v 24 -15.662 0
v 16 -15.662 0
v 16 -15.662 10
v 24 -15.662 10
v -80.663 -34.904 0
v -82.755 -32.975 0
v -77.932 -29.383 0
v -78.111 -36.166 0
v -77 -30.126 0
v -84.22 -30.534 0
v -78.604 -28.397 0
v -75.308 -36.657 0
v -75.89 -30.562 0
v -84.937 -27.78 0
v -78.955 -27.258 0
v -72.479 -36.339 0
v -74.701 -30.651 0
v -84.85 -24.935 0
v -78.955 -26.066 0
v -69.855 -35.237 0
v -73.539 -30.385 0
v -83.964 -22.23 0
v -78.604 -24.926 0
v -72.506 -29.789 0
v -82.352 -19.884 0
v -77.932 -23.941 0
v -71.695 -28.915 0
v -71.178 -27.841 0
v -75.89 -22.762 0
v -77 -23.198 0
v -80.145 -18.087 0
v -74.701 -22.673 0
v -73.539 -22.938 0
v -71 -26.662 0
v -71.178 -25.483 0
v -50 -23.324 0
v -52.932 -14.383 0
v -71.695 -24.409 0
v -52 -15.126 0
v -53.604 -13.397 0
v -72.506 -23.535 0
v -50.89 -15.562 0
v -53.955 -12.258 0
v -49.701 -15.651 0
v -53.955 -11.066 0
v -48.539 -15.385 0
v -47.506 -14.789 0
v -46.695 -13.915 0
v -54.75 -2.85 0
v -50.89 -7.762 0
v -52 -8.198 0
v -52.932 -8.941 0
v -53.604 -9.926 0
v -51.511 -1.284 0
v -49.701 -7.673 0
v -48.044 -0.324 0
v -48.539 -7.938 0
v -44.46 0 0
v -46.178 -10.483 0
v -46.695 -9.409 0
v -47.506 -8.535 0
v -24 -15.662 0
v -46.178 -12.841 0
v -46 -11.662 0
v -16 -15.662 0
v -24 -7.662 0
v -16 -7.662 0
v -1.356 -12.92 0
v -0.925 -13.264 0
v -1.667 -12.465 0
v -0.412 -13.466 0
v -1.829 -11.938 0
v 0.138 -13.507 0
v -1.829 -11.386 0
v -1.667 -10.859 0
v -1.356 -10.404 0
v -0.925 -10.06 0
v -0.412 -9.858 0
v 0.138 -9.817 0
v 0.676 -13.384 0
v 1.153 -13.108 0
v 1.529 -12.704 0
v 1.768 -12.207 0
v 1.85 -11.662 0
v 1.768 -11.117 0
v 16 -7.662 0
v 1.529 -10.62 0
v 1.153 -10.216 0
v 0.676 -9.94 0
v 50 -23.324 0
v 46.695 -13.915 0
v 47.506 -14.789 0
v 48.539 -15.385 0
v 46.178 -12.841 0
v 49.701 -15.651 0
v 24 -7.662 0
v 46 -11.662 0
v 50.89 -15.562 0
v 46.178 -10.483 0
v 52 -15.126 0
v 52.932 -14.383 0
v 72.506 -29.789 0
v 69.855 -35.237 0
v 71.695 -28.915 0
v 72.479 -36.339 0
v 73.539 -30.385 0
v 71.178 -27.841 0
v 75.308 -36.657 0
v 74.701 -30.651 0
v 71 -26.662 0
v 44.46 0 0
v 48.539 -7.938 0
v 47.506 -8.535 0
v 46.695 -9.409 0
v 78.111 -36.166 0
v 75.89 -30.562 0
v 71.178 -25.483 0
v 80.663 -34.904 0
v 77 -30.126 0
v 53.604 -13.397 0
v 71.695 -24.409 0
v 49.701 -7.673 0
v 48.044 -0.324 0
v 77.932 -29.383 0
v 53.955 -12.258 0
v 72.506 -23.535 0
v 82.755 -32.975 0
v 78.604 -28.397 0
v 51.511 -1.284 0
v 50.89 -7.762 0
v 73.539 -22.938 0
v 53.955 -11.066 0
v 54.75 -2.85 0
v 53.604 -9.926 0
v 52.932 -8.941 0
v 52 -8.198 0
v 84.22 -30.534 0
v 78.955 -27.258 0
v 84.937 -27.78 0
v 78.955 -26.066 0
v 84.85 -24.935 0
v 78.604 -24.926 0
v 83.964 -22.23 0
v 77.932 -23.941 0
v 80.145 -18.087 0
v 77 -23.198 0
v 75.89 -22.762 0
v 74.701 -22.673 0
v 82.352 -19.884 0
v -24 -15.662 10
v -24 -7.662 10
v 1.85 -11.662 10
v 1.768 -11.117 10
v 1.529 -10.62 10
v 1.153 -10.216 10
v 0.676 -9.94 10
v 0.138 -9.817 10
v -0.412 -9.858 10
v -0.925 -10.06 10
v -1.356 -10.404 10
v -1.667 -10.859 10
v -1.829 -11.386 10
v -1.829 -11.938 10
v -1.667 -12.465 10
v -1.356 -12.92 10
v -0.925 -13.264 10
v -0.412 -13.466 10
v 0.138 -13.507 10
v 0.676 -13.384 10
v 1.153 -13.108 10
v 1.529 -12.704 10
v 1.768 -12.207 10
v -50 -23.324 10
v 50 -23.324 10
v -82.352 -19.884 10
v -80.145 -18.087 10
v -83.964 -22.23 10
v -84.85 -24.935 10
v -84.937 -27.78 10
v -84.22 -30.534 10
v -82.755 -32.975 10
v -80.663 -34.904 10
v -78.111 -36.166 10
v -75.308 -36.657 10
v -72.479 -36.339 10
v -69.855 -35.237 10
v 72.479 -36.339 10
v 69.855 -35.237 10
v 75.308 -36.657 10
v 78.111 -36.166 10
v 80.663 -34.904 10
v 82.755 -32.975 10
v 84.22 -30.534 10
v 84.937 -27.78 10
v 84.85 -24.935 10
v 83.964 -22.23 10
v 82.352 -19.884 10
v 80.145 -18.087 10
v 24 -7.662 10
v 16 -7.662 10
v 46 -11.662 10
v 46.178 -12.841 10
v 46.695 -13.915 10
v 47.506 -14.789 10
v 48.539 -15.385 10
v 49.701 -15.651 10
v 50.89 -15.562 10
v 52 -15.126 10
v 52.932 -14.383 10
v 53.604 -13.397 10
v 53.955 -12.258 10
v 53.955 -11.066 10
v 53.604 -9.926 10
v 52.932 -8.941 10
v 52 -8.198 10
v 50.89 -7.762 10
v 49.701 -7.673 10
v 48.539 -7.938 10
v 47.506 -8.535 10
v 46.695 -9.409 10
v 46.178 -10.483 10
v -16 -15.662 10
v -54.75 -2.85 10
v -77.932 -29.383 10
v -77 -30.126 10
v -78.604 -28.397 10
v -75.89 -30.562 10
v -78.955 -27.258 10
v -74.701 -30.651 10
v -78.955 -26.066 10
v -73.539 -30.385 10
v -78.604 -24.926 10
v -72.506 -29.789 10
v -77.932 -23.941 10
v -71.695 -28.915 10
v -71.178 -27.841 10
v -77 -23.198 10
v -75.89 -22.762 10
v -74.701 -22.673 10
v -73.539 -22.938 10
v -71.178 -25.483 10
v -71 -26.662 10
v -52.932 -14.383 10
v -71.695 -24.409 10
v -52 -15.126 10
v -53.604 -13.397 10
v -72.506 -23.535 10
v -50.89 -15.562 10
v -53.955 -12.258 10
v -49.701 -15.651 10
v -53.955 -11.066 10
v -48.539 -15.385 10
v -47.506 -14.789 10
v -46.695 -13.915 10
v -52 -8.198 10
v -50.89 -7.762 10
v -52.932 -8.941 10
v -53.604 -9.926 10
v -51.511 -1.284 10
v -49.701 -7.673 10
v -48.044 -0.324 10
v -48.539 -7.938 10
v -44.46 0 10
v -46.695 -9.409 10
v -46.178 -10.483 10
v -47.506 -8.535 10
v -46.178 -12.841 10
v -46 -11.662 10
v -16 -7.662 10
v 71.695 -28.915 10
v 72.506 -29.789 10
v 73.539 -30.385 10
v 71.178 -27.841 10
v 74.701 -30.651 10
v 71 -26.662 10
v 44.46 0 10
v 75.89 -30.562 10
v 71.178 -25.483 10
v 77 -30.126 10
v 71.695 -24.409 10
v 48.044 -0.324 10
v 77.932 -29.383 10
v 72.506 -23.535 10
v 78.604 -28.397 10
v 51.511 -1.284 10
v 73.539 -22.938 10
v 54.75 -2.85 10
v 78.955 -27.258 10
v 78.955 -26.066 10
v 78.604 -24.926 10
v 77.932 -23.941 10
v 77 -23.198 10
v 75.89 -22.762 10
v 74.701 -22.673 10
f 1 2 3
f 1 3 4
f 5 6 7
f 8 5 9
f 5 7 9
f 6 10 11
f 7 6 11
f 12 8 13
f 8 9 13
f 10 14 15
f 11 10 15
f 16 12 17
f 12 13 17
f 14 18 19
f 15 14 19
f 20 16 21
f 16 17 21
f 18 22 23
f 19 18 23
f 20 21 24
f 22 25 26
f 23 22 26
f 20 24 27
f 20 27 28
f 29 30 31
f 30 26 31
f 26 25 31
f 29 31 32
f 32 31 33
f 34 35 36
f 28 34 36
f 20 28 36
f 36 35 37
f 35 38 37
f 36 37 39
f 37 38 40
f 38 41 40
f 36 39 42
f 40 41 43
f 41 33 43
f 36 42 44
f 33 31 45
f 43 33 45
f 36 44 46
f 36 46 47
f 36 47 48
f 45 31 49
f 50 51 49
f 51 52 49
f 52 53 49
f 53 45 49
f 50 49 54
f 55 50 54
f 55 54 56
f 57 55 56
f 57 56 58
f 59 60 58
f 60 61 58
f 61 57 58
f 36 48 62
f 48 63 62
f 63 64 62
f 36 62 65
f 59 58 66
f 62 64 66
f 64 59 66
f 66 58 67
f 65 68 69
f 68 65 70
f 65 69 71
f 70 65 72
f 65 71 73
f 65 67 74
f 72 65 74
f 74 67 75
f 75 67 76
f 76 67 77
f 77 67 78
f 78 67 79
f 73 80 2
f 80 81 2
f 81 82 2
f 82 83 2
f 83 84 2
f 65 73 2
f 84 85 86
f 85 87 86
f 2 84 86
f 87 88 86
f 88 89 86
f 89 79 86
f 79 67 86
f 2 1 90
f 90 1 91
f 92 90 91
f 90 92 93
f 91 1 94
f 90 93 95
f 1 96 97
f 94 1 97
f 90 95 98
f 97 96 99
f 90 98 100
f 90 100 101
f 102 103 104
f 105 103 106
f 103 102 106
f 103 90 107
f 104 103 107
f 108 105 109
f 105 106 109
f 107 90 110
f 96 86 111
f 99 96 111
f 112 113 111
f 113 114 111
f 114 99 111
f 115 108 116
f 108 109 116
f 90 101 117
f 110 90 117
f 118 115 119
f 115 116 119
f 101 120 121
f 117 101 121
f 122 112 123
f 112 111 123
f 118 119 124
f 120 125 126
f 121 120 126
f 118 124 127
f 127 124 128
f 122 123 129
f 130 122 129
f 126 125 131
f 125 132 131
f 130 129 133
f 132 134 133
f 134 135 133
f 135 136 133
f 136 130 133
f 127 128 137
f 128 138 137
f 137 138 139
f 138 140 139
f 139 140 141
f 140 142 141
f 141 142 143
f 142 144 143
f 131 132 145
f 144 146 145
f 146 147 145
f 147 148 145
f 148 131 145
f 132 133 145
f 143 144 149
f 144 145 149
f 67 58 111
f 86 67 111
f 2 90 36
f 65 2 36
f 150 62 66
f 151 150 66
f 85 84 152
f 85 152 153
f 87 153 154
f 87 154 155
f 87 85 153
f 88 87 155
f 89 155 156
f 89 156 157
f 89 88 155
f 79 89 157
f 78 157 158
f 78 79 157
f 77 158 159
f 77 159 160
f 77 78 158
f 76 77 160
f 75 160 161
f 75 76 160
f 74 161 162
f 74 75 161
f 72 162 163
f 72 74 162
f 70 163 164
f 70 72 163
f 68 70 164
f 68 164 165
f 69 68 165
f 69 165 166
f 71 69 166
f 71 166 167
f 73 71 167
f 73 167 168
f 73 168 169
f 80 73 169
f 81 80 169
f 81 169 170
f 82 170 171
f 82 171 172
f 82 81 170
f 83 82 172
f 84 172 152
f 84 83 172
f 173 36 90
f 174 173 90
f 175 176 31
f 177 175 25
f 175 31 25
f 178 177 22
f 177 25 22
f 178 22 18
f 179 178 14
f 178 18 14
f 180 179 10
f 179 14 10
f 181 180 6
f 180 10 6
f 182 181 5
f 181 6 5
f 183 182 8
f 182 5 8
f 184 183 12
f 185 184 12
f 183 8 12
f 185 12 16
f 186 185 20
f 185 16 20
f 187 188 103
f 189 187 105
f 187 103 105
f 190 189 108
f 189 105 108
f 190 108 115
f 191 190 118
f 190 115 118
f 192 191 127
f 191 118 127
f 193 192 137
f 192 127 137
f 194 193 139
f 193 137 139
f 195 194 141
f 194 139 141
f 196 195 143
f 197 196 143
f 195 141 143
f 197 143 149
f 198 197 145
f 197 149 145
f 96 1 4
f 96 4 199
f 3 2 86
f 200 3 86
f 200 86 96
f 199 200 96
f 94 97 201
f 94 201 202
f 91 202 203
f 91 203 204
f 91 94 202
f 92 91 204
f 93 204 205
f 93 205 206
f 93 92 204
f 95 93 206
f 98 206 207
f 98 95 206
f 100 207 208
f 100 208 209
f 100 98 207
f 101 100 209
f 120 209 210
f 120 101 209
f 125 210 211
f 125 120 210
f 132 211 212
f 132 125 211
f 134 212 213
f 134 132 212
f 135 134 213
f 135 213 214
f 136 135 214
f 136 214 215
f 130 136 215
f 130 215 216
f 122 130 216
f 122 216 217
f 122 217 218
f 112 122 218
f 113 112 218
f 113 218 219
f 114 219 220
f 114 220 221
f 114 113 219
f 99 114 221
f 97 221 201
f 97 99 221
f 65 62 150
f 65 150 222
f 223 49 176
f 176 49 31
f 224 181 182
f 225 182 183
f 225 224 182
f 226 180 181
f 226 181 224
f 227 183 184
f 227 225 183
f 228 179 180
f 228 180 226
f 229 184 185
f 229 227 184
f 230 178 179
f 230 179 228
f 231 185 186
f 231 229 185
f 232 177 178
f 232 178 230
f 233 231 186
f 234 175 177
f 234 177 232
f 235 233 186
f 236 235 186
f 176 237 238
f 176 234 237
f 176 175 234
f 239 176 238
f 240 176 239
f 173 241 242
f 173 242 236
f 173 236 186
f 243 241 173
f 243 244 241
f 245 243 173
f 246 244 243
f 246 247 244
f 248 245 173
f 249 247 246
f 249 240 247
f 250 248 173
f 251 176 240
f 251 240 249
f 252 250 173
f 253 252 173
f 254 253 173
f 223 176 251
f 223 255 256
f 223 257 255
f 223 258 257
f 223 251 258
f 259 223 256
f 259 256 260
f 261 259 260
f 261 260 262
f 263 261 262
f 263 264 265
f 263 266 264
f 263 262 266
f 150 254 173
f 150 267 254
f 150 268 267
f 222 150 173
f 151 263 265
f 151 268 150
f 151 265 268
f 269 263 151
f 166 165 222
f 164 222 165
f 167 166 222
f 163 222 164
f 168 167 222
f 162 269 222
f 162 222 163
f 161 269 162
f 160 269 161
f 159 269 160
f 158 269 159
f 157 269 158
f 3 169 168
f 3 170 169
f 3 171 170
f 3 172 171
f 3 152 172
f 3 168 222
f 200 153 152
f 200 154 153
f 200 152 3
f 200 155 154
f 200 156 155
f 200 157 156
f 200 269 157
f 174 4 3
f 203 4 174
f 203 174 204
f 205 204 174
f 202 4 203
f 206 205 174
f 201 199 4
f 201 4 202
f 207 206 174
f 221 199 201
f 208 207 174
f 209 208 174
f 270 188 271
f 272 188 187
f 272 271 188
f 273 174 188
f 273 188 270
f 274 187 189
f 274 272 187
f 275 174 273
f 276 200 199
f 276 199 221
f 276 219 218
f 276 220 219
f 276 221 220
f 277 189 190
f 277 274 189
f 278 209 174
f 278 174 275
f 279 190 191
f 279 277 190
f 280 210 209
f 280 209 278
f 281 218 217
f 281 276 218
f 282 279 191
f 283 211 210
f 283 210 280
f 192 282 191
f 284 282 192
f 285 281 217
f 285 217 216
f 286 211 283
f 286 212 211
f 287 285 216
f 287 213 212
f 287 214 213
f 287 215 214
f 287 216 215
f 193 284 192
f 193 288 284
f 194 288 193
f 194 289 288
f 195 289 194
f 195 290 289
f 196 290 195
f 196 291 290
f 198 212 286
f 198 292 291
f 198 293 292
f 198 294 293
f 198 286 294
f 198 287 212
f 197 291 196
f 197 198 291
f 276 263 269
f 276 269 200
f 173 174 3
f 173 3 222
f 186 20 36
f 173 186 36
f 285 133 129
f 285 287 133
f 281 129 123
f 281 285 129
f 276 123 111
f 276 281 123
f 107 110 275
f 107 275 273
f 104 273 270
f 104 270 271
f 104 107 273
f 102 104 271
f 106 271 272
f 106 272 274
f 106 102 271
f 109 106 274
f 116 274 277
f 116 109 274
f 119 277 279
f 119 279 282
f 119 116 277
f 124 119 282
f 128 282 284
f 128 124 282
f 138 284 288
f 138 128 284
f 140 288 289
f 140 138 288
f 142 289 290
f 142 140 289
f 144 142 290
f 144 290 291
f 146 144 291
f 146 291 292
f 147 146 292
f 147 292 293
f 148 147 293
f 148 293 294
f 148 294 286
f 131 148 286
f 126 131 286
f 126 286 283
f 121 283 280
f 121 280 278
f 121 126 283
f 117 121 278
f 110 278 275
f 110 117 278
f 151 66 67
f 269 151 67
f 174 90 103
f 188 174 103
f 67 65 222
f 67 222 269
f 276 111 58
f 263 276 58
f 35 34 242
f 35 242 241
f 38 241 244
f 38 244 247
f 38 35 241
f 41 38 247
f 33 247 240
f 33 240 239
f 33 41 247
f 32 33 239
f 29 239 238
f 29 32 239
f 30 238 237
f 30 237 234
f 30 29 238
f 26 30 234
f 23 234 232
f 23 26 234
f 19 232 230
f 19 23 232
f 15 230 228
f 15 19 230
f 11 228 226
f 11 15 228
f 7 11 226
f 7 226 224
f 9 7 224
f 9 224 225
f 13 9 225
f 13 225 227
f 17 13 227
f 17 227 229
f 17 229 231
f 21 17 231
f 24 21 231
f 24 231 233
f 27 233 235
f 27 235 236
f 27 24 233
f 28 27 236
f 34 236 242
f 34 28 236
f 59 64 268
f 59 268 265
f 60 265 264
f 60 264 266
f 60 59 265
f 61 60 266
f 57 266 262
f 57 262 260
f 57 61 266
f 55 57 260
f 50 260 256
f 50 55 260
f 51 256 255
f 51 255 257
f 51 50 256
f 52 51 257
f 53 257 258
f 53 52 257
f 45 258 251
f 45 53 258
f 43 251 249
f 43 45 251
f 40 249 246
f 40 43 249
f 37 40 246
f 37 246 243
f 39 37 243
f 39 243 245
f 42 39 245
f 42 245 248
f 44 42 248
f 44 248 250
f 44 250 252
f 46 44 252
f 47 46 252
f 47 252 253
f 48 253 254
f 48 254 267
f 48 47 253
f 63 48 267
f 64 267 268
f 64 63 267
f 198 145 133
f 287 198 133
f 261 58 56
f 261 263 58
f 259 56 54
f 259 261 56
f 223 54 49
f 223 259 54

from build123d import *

# Parameters (mm, degrees)
ESBO_O1_R                = 4
ESBO_O1_R_2              = 1.85
ESBO_O1_W                = 8
ESBO_O1_H                = 8
RESSALTO_EXTRUS_O1_DEPTH = 10
FILETE1_R                = 20


with BuildPart() as part:
    # Esboço1 → Ressalto-extrusão1 (new body)
    with BuildSketch(Plane.XY):
        with BuildLine():
            Line((80.144957554, -18.086974533), (50, 0))
            Line((50, 0), (0, 0))
            Line((0, 0), (-50, 0))
            Line((-50, 0), (-80.144957554, -18.086974533))
            ThreePointArc((-80.144957554, -18.086974533), (-83.574929257, -31.806861344), (-69.855042446, -35.236833047))
            Line((-69.855042446, -35.236833047), (-50, -23.323807579))
            Line((-50, -23.323807579), (50, -23.323807579))
            Line((50, -23.323807579), (69.855042446, -35.236833047))
            ThreePointArc((69.855042446, -35.236833047), (83.574929257, -31.806861344), (80.144957554, -18.086974533))
        make_face()
        with Locations((-50, -11.66190379)):
            Circle(ESBO_O1_R, mode=Mode.SUBTRACT)
        with Locations(Location((50, -11.66190379, 0), (0, 0, 180))):
            Circle(ESBO_O1_R, mode=Mode.SUBTRACT)
        with Locations((0, -11.66190379)):
            Circle(ESBO_O1_R_2, mode=Mode.SUBTRACT)
        with Locations((-75, -26.66190379)):
            Circle(ESBO_O1_R, mode=Mode.SUBTRACT)
        with Locations(Location((75, -26.66190379, 0), (0, 0, 180))):
            Circle(ESBO_O1_R, mode=Mode.SUBTRACT)
        with Locations((20, -11.66190379)):
            Rectangle(ESBO_O1_W, ESBO_O1_H, mode=Mode.SUBTRACT)
        with Locations((-20, -11.66190379)):
            Rectangle(ESBO_O1_W, ESBO_O1_H, mode=Mode.SUBTRACT)
    extrude(amount=RESSALTO_EXTRUS_O1_DEPTH)

    # Filete1
    filete1_edges = [part.edges().sort_by_distance(p)[0] for p in [
        (-50, 0, 5),
        (50, 0, 5),
    ]]
    fillet(filete1_edges, radius=FILETE1_R)


solid = part.part
